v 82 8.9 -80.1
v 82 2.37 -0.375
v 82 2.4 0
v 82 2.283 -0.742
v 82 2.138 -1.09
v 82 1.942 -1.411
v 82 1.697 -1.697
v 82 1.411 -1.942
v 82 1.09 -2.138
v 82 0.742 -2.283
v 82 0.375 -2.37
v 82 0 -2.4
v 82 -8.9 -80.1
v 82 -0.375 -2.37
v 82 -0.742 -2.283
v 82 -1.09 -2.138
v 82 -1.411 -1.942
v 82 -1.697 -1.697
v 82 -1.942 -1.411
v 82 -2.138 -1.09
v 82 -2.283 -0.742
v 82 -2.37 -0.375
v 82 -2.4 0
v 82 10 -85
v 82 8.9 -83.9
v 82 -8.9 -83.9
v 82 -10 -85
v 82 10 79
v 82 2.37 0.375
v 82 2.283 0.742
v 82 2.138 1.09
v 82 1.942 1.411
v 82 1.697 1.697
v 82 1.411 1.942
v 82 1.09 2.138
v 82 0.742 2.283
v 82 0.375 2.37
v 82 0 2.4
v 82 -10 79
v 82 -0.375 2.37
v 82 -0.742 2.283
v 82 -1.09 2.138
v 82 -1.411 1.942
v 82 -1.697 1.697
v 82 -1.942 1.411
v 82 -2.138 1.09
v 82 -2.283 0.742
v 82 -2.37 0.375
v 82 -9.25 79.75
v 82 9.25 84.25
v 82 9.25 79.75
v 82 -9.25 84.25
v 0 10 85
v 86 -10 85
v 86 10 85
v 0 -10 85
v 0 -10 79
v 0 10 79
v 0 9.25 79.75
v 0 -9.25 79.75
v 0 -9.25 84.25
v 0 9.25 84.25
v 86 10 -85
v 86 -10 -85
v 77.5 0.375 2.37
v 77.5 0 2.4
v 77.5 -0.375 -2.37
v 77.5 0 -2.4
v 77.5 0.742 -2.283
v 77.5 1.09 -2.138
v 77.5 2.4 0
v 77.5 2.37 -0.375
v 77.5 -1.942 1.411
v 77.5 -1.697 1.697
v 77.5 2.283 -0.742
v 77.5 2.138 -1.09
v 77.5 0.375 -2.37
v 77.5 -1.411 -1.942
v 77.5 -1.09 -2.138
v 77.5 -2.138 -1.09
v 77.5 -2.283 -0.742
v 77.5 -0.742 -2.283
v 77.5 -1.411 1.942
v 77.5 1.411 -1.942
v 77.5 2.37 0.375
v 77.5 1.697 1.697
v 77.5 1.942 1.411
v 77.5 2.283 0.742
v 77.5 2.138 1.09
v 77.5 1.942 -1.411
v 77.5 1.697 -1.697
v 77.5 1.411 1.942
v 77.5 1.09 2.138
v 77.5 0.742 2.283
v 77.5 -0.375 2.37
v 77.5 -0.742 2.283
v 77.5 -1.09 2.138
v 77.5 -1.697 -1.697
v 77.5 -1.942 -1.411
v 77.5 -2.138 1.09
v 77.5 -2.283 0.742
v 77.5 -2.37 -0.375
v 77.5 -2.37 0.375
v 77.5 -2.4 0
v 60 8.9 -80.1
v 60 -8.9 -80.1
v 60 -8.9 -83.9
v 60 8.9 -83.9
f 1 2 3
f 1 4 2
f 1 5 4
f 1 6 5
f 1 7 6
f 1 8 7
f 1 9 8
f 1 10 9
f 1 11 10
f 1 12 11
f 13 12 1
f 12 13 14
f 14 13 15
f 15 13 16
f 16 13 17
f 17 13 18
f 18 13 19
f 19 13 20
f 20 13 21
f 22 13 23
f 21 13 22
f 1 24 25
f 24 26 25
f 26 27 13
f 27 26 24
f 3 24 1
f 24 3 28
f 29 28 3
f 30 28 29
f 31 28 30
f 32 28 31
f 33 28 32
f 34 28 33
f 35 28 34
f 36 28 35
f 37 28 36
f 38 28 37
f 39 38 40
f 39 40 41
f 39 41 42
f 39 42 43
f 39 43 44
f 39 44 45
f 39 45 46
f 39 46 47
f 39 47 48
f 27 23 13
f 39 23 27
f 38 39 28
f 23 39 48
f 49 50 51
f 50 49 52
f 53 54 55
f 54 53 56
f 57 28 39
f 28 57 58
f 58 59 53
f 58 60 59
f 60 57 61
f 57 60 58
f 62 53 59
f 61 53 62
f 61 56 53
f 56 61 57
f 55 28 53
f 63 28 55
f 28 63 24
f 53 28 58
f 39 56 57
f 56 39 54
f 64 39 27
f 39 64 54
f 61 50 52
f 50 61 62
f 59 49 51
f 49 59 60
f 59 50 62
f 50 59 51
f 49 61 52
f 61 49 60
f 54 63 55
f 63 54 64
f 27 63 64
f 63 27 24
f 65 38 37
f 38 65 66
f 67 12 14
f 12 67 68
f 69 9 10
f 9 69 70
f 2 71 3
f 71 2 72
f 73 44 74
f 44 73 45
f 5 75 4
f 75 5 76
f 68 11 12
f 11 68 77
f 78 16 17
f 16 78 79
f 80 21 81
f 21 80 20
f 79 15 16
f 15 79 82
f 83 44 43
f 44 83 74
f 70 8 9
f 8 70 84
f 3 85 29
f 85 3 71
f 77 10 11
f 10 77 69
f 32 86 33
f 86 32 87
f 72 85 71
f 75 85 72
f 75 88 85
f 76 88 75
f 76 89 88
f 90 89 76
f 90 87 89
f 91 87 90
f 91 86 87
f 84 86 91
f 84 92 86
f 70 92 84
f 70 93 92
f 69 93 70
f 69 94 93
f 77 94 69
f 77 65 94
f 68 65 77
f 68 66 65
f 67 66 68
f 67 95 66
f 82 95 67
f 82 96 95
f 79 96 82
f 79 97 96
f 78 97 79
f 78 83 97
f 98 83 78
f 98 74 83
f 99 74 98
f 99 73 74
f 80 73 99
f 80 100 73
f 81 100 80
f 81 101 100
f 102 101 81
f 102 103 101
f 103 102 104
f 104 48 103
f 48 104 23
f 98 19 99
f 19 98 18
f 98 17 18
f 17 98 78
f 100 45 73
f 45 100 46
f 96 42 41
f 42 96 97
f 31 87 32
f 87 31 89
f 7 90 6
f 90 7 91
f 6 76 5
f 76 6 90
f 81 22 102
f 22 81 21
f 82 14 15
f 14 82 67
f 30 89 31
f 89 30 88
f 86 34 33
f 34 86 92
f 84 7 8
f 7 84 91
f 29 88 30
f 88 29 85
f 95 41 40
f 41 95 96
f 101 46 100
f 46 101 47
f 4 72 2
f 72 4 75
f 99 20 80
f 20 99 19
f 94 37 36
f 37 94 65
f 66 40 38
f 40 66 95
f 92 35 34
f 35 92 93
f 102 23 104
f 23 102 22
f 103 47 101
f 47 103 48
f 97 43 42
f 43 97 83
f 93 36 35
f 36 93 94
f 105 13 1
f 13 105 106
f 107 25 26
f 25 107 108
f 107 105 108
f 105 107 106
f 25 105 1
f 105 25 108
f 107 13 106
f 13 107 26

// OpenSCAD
% union() {
// Seitenwand links
translate([-2, 0, 0]) cube(size=[4, 20, 90+80], center=true);
// Nupsi links
translate([-2.5 + 4,0,0]) rotate([0,90,0]) cylinder(h=5, r1=2.4, r2=2.4, center=true, $fn=40);
// Führung Links unten
translate([41,0,-82]) difference() {
	cube(size=[82, 20, 6], center=true);
	cube(size=[90, 18.5, 4.5], center=true);
}
// Führung links oben
translate([11,0,82]) cube(size=[22, 17.8, 3.8], center=true);


// Oberkante
translate([8,-12,60]) cube(size=[24, 6.5, 3], center=true);
// Stab
translate([-2,-12.5,60]) cube(size=[4, 5, 10], center=true);

}



union() {


// Seitenwand rechts
translate([84, 0, 0]) cube(size=[4, 20, 90+80], center=true);
// Nupsi rechts
translate([80,0,0]) rotate([0,90,0]) cylinder(h=5, r1=2.4, r2=2.4, center=true, $fn=40);
// Führung rechts unten
translate([71,0,-82]) cube(size=[22, 17.8, 3.8], center=true);

// Führung rechts oben
translate([41,0,82]) difference() {
	cube(size=[82, 20, 6], center=true);
	cube(size=[90, 18.5, 4.5], center=true);
}

// Oberkante Dummy
% translate([70,0,60]) cube(size=[30, 17.8, 3.8], center=true);





% translate([41,0,-82]) difference() {
	cube(size=[82, 20, 6], center=true);
	cube(size=[90, 18.5, 4.5], center=true);
}
}
